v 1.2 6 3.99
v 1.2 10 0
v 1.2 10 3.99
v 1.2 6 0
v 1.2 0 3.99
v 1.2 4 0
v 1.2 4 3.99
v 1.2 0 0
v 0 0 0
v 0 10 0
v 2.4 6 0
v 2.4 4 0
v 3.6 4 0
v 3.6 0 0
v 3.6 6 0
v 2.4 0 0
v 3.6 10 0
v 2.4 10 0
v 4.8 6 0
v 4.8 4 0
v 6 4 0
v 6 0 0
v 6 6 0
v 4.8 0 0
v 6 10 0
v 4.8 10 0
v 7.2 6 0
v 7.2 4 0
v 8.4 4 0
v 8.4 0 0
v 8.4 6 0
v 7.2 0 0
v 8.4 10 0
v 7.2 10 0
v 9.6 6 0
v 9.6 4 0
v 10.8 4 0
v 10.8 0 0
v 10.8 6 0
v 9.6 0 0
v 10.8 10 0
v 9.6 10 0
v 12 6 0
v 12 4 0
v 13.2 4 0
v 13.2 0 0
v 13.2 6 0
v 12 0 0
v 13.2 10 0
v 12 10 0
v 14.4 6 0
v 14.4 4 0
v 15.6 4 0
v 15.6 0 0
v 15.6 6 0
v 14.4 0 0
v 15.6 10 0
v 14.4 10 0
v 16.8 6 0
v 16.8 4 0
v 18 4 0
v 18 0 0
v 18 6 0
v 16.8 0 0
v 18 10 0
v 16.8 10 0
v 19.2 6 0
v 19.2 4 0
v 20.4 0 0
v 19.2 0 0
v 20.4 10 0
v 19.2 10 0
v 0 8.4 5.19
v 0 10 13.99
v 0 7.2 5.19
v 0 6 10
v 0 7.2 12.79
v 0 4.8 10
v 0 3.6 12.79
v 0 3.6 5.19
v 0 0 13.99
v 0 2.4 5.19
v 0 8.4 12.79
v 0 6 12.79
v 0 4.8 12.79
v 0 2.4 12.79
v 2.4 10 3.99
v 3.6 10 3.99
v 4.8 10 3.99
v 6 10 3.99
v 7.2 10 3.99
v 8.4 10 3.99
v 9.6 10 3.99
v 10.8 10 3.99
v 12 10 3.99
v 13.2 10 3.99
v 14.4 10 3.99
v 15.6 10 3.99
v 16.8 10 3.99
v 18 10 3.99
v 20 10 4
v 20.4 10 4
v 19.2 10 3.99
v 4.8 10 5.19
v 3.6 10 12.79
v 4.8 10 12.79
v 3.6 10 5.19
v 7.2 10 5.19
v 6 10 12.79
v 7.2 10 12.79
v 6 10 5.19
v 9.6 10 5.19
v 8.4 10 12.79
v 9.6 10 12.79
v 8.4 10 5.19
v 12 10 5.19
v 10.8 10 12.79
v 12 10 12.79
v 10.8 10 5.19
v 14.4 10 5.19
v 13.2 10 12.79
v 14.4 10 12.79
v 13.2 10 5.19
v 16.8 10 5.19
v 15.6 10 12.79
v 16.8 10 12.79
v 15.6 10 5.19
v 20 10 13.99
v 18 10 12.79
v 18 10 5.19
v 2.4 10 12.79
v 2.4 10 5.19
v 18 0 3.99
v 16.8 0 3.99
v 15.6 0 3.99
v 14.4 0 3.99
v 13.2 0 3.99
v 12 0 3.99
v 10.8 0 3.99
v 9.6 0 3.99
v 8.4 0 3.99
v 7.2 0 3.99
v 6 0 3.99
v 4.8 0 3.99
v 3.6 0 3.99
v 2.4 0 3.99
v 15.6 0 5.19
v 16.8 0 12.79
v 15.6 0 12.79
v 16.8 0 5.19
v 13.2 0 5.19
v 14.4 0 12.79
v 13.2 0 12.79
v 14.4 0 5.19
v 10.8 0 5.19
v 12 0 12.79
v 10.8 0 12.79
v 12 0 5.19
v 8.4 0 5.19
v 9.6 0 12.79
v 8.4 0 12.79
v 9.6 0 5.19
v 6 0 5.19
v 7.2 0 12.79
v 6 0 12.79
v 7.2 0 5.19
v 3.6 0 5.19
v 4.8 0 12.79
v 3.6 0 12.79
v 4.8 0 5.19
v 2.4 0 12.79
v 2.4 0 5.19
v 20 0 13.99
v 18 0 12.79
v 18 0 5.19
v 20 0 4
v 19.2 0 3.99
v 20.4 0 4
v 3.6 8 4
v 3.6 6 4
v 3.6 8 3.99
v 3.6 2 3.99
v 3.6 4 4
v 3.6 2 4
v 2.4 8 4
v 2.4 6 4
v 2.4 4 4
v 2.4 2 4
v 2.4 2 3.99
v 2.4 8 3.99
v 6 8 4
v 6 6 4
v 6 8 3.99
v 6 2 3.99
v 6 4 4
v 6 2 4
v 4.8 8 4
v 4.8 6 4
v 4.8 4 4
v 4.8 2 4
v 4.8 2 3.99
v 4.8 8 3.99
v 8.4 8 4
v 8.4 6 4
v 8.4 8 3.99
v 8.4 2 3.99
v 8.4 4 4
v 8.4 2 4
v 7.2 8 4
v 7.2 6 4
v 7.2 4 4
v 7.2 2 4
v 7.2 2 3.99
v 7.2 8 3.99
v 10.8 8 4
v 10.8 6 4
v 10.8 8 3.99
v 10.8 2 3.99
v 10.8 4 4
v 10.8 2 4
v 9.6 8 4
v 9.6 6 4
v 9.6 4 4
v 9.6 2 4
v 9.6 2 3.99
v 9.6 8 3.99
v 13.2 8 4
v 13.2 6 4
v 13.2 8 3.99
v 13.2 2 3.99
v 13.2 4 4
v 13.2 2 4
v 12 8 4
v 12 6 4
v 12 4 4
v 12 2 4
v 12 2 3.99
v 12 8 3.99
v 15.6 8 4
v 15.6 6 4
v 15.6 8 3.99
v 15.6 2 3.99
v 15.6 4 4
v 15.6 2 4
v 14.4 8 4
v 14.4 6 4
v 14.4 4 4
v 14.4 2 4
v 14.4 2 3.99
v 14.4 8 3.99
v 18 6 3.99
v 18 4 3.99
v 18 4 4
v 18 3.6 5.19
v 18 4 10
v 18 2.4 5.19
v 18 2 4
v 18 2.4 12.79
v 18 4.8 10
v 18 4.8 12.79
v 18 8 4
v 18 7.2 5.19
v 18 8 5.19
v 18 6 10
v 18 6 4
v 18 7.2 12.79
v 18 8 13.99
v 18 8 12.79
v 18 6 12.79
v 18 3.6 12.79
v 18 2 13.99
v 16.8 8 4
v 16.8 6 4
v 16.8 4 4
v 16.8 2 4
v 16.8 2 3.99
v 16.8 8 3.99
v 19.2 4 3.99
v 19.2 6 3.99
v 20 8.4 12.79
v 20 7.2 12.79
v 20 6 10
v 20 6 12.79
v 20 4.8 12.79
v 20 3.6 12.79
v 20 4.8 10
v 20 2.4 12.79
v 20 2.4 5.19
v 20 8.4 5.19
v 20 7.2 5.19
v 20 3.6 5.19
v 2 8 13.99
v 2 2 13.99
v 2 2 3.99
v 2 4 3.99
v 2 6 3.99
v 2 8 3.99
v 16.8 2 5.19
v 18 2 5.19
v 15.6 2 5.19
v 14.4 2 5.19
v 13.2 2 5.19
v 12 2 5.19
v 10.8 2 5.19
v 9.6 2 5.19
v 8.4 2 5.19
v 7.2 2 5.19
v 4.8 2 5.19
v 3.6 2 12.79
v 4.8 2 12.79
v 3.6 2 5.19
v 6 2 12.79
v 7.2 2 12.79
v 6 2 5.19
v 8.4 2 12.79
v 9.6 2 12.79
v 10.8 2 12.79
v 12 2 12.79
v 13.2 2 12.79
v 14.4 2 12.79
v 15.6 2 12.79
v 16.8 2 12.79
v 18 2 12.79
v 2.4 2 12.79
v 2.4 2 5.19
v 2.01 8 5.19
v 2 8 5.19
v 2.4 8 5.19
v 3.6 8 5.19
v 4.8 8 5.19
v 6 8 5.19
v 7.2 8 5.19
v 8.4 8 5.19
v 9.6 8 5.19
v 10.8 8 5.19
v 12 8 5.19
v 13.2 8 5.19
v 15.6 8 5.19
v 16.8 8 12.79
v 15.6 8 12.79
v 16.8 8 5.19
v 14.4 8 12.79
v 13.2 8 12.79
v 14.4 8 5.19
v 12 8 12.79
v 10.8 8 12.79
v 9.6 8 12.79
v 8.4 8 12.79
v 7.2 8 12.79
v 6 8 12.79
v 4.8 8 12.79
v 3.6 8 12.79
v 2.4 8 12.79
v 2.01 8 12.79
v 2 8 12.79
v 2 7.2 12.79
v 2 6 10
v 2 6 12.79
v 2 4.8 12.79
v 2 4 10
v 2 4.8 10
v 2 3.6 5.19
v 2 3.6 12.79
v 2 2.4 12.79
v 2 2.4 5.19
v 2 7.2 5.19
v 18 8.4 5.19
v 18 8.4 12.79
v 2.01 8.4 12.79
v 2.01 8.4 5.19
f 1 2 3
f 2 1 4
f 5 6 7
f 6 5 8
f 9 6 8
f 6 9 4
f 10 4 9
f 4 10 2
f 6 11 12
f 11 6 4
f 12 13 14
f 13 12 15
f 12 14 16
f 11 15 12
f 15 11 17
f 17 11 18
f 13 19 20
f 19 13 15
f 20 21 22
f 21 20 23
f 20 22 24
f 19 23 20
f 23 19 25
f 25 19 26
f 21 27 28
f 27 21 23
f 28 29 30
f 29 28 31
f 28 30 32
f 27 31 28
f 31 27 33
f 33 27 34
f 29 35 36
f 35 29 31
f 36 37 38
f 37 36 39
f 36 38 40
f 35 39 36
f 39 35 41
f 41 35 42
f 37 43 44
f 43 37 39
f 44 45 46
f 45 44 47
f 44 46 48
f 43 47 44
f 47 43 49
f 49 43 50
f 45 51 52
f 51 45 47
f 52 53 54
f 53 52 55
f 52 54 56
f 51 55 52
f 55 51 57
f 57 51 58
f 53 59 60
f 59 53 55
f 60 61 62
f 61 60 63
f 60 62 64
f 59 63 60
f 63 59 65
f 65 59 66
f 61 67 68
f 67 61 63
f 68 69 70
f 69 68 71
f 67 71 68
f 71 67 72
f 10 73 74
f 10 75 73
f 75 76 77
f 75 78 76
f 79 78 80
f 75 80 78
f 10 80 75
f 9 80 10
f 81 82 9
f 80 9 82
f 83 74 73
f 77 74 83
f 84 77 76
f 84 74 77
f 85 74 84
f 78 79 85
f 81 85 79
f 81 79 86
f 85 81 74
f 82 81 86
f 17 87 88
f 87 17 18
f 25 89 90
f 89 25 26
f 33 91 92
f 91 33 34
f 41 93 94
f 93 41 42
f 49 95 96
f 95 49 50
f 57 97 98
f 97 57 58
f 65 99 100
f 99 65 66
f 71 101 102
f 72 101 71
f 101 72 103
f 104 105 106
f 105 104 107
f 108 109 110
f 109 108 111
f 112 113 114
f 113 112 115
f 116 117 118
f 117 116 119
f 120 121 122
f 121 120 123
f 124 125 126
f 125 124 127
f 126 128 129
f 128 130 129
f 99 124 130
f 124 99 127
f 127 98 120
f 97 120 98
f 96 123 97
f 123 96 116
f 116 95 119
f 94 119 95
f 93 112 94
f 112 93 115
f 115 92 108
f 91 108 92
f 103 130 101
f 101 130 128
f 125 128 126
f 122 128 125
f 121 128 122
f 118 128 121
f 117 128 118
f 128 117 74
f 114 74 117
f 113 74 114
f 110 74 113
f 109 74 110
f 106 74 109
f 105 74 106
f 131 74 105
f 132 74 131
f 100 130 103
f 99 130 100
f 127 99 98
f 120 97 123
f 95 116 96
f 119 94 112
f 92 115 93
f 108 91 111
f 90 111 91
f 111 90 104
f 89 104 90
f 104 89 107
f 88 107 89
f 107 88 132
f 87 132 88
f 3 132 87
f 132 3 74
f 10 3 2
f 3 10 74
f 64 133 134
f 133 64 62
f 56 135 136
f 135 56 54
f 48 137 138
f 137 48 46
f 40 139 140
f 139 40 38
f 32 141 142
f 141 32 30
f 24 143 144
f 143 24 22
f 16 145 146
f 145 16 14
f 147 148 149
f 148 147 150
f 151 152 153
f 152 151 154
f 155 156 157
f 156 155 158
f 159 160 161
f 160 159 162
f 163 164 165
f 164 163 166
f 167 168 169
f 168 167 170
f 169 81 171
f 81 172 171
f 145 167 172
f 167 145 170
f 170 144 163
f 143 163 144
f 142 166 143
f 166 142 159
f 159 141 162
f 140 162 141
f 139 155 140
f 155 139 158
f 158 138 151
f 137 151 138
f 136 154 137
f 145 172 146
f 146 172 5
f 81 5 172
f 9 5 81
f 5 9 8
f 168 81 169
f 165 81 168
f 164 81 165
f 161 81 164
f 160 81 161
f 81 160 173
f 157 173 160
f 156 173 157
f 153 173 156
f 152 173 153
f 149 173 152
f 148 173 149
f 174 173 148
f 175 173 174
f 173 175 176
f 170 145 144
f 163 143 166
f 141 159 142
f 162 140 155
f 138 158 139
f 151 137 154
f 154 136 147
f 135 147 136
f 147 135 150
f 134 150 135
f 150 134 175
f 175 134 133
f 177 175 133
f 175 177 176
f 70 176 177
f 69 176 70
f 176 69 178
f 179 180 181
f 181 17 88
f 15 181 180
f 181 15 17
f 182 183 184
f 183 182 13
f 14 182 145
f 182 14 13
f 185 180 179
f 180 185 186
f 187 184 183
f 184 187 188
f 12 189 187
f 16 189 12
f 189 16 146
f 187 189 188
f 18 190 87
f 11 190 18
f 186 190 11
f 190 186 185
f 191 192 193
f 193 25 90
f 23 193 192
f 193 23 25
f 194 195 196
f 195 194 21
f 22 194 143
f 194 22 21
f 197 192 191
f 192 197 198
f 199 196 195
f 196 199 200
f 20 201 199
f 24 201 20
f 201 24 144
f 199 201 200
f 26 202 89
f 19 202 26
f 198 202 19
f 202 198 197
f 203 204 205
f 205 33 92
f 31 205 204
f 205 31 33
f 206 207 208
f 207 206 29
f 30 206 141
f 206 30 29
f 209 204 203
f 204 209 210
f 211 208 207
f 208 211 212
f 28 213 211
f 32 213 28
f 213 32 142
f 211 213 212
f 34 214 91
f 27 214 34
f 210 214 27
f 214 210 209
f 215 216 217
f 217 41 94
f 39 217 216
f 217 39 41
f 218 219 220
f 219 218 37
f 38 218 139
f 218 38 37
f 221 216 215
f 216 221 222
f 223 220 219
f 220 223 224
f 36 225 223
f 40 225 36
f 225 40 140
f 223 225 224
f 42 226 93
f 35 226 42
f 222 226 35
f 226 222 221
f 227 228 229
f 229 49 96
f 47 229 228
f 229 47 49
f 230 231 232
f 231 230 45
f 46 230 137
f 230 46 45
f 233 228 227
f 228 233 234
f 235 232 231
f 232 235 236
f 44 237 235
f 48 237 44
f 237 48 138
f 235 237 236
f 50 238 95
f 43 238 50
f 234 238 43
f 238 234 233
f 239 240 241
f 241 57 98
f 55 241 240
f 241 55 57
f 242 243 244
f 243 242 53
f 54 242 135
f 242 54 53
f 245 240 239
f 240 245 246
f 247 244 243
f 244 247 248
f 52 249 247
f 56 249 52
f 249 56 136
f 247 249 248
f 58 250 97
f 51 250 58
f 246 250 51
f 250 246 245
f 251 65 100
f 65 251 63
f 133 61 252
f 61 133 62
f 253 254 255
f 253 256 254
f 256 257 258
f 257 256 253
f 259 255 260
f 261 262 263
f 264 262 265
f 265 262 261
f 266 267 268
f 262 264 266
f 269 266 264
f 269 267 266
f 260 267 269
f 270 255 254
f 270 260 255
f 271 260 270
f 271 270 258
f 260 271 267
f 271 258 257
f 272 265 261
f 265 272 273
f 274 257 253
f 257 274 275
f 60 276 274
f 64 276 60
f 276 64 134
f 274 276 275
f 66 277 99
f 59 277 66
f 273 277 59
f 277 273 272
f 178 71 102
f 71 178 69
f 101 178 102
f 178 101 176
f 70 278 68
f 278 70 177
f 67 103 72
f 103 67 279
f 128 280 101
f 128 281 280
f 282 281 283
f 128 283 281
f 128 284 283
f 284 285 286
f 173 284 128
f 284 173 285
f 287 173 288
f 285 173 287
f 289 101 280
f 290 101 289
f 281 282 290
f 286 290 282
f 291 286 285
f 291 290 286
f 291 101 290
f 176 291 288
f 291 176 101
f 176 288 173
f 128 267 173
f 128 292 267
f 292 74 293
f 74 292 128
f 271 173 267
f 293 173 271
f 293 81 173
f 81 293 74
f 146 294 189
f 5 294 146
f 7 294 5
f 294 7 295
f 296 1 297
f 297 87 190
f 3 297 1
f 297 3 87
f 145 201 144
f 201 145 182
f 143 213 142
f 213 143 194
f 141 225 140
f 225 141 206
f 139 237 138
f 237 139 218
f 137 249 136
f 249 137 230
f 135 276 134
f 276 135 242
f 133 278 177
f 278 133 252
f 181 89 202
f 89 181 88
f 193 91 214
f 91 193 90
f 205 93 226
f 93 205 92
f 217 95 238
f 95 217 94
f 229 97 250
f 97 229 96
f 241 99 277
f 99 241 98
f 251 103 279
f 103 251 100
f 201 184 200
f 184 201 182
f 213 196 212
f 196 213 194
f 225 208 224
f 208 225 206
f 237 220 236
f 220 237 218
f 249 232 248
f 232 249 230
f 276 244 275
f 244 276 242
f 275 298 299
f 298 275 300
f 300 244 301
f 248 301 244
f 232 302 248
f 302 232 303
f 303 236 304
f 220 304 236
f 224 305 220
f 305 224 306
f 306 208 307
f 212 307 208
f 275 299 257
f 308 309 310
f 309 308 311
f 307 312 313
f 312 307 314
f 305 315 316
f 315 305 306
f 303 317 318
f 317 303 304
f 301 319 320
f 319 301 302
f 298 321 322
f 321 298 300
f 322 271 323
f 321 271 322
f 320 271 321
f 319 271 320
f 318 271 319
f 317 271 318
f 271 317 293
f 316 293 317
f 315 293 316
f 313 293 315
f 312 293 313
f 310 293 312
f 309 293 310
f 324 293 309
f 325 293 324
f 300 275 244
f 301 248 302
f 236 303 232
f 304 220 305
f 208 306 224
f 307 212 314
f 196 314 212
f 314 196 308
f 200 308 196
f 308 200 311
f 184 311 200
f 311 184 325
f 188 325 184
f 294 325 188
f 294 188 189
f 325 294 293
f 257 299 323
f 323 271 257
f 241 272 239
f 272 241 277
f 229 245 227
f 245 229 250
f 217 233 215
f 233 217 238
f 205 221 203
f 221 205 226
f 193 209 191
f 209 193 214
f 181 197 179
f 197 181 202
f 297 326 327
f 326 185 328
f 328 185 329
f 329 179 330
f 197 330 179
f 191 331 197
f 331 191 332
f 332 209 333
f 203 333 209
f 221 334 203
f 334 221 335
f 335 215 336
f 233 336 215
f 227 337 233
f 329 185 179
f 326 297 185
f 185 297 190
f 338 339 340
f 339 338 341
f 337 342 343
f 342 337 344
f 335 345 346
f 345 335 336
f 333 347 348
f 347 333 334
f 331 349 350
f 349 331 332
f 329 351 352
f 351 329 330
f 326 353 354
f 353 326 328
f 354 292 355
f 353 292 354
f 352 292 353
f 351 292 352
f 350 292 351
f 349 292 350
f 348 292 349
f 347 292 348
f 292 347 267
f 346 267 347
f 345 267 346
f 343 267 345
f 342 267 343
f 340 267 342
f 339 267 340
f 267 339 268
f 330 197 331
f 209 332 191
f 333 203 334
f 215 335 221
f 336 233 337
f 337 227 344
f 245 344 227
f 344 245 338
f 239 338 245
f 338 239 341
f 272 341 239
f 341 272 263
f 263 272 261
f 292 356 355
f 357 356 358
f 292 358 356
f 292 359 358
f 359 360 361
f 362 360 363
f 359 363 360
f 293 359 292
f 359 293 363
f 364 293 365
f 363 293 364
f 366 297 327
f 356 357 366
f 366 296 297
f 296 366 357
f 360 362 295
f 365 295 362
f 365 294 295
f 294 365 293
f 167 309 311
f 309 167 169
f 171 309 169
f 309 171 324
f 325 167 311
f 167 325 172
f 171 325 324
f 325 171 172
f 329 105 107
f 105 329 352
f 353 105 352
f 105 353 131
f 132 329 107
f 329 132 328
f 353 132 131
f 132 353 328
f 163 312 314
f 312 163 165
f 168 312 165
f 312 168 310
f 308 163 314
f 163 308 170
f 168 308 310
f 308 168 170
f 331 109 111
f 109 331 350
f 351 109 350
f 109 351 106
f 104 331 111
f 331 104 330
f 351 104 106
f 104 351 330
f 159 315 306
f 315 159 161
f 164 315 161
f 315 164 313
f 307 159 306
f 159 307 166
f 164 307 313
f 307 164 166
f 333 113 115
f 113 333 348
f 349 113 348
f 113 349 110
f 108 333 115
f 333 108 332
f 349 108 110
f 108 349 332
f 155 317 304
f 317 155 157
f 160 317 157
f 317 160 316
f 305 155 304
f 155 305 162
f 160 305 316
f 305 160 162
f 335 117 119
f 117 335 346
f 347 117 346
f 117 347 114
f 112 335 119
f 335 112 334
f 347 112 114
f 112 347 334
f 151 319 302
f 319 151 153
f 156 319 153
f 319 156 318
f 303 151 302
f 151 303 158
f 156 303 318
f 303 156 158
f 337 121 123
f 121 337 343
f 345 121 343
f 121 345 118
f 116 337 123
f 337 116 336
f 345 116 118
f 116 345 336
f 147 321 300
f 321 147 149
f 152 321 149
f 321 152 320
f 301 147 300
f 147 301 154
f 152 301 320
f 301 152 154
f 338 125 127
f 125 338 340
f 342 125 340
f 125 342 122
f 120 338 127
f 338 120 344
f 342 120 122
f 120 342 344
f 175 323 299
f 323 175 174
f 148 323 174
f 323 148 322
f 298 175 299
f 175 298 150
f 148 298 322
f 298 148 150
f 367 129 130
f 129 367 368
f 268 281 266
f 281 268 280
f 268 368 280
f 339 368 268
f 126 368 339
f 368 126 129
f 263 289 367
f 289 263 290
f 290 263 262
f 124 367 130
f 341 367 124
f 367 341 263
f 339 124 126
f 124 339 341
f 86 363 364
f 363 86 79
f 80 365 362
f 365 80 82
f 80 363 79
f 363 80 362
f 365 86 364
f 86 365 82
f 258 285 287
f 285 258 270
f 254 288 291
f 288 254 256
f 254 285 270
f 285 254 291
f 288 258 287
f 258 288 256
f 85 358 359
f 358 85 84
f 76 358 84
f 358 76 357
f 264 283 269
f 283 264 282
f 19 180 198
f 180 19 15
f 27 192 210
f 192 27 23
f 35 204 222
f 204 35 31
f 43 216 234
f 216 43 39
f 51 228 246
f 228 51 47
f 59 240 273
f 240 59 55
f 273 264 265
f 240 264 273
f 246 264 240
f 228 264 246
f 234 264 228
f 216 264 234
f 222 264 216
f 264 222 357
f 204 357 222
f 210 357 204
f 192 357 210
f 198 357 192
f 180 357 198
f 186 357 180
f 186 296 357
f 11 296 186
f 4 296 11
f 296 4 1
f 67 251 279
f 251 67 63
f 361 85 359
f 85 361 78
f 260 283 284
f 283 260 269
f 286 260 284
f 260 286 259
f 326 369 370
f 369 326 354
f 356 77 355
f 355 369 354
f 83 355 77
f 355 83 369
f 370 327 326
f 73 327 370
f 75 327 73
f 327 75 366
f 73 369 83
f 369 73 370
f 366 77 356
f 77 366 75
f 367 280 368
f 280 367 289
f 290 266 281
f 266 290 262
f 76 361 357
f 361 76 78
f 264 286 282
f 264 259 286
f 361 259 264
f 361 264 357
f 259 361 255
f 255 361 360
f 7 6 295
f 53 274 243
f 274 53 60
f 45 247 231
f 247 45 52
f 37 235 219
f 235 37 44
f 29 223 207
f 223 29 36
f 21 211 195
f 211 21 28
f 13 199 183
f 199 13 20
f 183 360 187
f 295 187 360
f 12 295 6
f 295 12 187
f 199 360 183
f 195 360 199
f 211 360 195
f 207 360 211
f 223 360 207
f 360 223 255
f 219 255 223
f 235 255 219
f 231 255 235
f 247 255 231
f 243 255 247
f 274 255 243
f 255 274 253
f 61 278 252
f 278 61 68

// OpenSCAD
width = 20;
depth = 10;
gap = 1.2;
stand_height = 4;
wall_thickness = 2;
height = 10;
tolerance = .3;
top_height = 5;
top_support_thickness = 6;

module stand() {
    for (i = [0:gap*2:width]) {
        translate([i,0,0]) cube([gap, depth, stand_height]);
    }
}

module box(width = width, depth = depth, height = height) {
    translate([0,0,0]) cube([width, wall_thickness, height]);
    translate([width-wall_thickness,0,0]) cube([wall_thickness, depth, height]);
    translate([0,depth-wall_thickness,0]) cube([width, wall_thickness, height]);
    translate([0,0,0]) cube([wall_thickness, depth, height]);
}

module side_slots(width = width, depth = depth, height = height, inset = 0) {
    for (i = [inset+gap*2:gap*2:width-gap*2]) {
        translate([i, -0.01, gap]) cube([gap, wall_thickness+.02, height - gap*2]);
        translate([i, depth-wall_thickness-.01+inset, gap]) cube([gap, wall_thickness+.02, height - gap*2]);
    }
    for (i = [inset+gap*2:gap*2:depth-gap*2]) {
        translate([-.01, i, gap]) cube([wall_thickness+.02, gap, height - gap*2]);
        translate([width-wall_thickness-.01+inset, i, gap]) cube([wall_thickness+.02, gap, height - gap*2]);
    }
}

module box_bottom() {
    stand();
    translate([0,(depth-wall_thickness)/2,0]) cube([width, wall_thickness, height]);
    difference() {
        translate([0,0,stand_height-.01]) box();
        translate([0,0,stand_height-.01]) side_slots();
    }
}

module box_top() {
    difference() {
        box(width + wall_thickness*2 + tolerance, depth+wall_thickness*2+tolerance, top_height);
        side_slots(width + wall_thickness + tolerance, depth+wall_thickness+tolerance, top_height, wall_thickness);
    }
    //translate([wall_thickness,(depth+wall_thickness*2)/2-top_support_thickness/2,top_height - wall_thickness]) cube([width+tolerance*2+.02, top_support_thickness, wall_thickness]);
    for (i = [wall_thickness+gap:gap*2:width+wall_thickness]) {
        translate([i,wall_thickness-.01,top_height - wall_thickness]) cube([gap, depth+2*tolerance+.02, wall_thickness]);
    }
}

box_bottom();
//translate([-wall_thickness-tolerance/2,-wall_thickness-tolerance/2,stand_height+height-top_height+wall_thickness]) box_top();
//translate([0, -10, top_height]) rotate([180,0,0]) box_top();
